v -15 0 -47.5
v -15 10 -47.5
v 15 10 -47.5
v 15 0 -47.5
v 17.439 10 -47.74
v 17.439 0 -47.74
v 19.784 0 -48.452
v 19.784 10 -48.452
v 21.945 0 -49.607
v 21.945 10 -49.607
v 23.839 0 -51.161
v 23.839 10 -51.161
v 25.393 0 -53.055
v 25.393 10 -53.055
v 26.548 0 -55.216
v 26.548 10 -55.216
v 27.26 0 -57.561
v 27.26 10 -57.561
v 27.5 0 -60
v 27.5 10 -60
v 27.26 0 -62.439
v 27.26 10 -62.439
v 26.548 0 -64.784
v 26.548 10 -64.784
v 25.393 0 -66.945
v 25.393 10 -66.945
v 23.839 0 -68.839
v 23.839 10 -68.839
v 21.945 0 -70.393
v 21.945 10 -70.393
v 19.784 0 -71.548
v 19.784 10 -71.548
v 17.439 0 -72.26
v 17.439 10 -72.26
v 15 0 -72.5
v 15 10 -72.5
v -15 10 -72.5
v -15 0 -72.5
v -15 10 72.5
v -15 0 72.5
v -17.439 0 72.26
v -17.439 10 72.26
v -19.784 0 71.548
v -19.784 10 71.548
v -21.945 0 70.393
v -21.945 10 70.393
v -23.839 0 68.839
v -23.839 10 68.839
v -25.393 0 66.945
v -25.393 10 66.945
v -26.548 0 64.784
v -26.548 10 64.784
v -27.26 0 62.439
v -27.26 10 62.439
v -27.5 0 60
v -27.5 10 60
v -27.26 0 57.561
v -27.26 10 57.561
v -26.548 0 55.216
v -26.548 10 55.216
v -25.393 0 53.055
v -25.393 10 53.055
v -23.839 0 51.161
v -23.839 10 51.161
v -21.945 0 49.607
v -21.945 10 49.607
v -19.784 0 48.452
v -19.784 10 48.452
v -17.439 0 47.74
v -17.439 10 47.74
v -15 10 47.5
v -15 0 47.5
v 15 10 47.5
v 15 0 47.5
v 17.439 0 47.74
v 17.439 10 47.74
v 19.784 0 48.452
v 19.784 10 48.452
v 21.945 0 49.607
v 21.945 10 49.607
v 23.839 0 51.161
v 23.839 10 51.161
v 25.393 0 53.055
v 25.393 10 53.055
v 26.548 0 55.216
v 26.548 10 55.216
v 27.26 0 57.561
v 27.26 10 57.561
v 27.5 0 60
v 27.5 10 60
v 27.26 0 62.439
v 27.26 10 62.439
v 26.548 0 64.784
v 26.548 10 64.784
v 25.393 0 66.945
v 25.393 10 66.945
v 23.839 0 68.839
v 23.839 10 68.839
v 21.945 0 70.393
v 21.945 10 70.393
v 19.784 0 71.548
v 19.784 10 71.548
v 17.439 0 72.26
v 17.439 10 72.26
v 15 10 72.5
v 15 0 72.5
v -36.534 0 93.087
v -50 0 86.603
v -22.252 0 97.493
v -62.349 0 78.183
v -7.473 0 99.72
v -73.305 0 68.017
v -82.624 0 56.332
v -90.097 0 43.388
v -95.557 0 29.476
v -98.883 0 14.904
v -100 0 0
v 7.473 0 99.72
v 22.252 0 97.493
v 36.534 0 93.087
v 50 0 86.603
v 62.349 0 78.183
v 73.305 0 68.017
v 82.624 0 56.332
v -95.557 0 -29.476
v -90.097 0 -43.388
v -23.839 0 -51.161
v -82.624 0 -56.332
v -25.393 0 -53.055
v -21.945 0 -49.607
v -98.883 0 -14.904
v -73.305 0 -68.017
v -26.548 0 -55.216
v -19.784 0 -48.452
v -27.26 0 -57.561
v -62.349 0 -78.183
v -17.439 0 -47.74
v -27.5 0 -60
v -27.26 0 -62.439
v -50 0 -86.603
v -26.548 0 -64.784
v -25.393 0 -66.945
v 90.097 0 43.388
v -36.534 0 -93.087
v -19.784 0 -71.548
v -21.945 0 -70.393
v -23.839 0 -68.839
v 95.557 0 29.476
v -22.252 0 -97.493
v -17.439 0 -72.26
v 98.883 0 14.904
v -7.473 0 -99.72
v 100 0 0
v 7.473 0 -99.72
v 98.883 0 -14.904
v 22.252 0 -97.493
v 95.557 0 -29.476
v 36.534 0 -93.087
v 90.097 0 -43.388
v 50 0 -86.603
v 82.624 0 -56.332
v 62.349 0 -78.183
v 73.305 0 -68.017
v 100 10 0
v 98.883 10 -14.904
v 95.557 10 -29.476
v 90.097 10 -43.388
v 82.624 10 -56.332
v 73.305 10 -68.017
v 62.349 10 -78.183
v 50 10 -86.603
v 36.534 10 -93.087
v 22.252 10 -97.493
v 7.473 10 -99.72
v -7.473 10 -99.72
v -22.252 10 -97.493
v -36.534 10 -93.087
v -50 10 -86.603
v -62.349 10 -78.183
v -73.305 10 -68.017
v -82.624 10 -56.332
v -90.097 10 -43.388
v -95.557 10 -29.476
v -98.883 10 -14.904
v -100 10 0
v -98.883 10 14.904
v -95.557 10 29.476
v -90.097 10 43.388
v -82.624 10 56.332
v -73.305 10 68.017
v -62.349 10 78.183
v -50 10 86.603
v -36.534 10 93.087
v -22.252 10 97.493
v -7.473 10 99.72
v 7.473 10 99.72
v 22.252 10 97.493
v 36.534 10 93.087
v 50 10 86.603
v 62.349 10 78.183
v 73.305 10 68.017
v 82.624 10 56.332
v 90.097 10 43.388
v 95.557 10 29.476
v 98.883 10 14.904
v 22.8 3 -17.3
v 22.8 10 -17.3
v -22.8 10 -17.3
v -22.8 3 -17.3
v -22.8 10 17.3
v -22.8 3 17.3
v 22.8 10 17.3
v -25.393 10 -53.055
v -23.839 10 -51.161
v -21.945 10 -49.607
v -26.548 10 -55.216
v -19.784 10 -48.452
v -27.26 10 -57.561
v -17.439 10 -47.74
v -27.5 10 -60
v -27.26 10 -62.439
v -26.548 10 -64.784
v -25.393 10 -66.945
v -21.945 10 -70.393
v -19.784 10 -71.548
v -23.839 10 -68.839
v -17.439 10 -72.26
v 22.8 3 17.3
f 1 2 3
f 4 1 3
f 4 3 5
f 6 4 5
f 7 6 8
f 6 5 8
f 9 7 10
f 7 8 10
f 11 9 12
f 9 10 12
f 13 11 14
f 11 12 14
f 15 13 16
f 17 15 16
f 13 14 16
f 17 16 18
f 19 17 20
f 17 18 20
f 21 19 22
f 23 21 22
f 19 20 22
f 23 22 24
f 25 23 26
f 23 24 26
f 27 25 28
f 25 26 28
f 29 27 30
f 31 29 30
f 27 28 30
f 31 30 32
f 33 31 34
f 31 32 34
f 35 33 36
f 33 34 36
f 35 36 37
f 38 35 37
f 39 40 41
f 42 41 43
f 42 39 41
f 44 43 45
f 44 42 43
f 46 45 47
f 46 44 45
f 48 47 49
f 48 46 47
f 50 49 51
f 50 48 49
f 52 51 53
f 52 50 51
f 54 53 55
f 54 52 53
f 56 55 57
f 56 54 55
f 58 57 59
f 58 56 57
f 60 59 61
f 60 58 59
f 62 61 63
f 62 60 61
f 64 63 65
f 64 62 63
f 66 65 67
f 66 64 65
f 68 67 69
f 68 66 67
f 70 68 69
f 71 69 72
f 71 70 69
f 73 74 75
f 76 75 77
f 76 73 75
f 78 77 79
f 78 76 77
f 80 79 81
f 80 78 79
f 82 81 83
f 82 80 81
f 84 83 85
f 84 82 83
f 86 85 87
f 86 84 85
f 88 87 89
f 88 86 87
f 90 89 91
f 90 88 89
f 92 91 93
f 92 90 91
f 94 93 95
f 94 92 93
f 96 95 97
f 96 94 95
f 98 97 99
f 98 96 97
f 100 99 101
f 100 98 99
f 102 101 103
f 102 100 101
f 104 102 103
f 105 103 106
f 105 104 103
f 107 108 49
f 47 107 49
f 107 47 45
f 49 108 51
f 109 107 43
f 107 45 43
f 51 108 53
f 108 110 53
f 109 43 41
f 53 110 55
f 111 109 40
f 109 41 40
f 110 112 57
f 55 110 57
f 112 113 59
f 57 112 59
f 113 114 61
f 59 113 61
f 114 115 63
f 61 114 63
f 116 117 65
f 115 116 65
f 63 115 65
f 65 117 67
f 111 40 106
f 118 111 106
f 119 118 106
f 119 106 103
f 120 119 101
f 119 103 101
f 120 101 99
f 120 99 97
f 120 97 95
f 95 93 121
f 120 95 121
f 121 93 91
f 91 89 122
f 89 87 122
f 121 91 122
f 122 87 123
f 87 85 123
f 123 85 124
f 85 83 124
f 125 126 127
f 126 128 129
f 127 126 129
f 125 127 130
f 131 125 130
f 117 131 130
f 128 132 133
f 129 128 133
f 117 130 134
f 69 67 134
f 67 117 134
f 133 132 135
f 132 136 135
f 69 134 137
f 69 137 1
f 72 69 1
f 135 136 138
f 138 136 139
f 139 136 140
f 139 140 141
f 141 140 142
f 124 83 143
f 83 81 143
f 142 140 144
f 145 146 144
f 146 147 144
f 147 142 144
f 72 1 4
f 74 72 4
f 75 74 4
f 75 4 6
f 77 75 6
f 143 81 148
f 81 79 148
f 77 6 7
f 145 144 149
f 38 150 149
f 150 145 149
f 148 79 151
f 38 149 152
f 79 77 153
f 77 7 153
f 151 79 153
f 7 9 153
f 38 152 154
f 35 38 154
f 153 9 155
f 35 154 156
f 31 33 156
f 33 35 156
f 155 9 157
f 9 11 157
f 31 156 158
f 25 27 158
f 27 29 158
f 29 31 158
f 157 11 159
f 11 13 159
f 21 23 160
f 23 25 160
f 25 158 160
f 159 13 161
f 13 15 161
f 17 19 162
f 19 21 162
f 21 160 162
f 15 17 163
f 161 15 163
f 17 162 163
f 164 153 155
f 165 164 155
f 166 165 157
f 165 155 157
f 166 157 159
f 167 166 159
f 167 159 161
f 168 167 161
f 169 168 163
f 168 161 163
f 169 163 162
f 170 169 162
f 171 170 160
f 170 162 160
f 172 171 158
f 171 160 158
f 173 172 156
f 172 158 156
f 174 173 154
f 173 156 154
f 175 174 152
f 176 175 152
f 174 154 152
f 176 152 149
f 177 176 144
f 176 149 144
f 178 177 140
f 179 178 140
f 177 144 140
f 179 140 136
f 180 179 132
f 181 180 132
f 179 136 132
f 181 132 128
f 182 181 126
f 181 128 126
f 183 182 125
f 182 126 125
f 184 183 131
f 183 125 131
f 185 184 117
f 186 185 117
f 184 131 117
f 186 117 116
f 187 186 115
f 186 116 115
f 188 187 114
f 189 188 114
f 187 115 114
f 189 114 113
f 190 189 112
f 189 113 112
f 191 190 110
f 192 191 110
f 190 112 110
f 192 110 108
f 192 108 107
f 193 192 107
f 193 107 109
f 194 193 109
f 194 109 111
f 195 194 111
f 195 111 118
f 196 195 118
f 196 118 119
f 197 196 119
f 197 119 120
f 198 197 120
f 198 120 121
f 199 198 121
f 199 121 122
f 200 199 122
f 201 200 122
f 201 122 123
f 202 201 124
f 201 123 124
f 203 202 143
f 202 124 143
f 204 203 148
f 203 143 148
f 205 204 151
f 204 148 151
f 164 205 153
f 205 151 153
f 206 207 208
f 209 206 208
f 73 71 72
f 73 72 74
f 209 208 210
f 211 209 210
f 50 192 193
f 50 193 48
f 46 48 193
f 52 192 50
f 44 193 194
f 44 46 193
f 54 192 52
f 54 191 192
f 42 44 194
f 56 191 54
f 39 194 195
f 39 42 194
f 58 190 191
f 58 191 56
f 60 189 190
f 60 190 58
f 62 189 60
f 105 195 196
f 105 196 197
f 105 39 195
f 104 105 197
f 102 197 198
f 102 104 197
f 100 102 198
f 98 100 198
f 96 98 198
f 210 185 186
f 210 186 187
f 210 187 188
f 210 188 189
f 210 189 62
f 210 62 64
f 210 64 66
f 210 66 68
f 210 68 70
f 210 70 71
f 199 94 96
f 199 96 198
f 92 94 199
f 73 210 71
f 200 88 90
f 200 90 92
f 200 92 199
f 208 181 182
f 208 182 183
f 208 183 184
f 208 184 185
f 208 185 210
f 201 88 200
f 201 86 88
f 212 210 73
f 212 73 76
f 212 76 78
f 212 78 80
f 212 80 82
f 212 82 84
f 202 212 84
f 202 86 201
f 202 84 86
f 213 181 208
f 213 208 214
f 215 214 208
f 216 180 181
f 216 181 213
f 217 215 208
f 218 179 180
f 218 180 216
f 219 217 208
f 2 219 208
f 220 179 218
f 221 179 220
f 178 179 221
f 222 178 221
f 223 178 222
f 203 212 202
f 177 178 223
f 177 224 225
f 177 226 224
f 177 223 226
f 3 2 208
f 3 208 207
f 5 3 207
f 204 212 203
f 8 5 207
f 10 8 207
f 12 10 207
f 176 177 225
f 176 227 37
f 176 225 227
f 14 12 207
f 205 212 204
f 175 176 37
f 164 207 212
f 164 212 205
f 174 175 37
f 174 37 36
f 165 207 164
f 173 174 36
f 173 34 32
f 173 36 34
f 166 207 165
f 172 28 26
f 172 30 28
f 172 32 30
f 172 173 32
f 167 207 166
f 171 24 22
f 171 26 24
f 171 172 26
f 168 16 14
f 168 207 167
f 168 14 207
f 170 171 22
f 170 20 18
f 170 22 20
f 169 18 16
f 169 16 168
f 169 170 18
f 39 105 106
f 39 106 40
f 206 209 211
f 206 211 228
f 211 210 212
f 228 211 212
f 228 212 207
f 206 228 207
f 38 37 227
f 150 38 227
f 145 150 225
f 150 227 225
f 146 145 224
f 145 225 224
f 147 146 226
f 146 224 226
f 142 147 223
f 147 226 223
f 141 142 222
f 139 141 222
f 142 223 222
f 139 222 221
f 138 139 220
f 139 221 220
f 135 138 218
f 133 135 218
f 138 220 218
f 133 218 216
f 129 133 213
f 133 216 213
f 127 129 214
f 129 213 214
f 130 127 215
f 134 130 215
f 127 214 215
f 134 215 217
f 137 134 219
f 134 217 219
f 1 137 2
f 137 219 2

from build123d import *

# Parameters (mm, degrees)
SKETCH1_R           = 100
BOSS_EXTRUDE1_DEPTH = 10
CUT_EXTRUDE1_DEPTH  = 11
CUT_EXTRUDE2_DEPTH  = 7


with BuildPart() as part:
    # Sketch1 → Boss-Extrude1 (new body)
    with BuildSketch(Plane(origin=(0, 0, 0), x_dir=(1, 0, 0), z_dir=(0, 1, 0))):
        Circle(SKETCH1_R)
    extrude(amount=BOSS_EXTRUDE1_DEPTH)

    # Sketch2 → Cut-Extrude1 (cut, through all)
    with BuildSketch(Plane(origin=(0, 10, 0), x_dir=(1, 0, 0), z_dir=(0, 1, 0))):
        with BuildLine():
            Line((-15, -47.5), (15, -47.5))
            ThreePointArc((15, -47.5), (27.5, -60), (15, -72.5))
            Line((15, -72.5), (-15, -72.5))
            ThreePointArc((-15, -72.5), (-27.5, -60), (-15, -47.5))
        make_face()
    cut_extrude1 = extrude(amount=-CUT_EXTRUDE1_DEPTH, mode=Mode.SUBTRACT)

    # Mirror1: Cut-Extrude1 across plane
    add(cut_extrude1.mirror(Plane.XY), mode=Mode.SUBTRACT)

    # Sketch3 → Cut-Extrude2 (cut)
    with BuildSketch(Plane(origin=(0, 10, 0), x_dir=(1, 0, 0), z_dir=(0, 1, 0))):
        Polygon((-22.8, 17.3), (-22.8, -17.3), (0, 0), align=None)
        Polygon((-22.8, 17.3), (0, 0), (22.8, 17.3), align=None)
        Polygon((22.8, 17.3), (0, 0), (22.8, -17.3), align=None)
        Polygon((0, 0), (-22.8, -17.3), (22.8, -17.3), align=None)
    extrude(amount=-CUT_EXTRUDE2_DEPTH, mode=Mode.SUBTRACT)


solid = part.part
